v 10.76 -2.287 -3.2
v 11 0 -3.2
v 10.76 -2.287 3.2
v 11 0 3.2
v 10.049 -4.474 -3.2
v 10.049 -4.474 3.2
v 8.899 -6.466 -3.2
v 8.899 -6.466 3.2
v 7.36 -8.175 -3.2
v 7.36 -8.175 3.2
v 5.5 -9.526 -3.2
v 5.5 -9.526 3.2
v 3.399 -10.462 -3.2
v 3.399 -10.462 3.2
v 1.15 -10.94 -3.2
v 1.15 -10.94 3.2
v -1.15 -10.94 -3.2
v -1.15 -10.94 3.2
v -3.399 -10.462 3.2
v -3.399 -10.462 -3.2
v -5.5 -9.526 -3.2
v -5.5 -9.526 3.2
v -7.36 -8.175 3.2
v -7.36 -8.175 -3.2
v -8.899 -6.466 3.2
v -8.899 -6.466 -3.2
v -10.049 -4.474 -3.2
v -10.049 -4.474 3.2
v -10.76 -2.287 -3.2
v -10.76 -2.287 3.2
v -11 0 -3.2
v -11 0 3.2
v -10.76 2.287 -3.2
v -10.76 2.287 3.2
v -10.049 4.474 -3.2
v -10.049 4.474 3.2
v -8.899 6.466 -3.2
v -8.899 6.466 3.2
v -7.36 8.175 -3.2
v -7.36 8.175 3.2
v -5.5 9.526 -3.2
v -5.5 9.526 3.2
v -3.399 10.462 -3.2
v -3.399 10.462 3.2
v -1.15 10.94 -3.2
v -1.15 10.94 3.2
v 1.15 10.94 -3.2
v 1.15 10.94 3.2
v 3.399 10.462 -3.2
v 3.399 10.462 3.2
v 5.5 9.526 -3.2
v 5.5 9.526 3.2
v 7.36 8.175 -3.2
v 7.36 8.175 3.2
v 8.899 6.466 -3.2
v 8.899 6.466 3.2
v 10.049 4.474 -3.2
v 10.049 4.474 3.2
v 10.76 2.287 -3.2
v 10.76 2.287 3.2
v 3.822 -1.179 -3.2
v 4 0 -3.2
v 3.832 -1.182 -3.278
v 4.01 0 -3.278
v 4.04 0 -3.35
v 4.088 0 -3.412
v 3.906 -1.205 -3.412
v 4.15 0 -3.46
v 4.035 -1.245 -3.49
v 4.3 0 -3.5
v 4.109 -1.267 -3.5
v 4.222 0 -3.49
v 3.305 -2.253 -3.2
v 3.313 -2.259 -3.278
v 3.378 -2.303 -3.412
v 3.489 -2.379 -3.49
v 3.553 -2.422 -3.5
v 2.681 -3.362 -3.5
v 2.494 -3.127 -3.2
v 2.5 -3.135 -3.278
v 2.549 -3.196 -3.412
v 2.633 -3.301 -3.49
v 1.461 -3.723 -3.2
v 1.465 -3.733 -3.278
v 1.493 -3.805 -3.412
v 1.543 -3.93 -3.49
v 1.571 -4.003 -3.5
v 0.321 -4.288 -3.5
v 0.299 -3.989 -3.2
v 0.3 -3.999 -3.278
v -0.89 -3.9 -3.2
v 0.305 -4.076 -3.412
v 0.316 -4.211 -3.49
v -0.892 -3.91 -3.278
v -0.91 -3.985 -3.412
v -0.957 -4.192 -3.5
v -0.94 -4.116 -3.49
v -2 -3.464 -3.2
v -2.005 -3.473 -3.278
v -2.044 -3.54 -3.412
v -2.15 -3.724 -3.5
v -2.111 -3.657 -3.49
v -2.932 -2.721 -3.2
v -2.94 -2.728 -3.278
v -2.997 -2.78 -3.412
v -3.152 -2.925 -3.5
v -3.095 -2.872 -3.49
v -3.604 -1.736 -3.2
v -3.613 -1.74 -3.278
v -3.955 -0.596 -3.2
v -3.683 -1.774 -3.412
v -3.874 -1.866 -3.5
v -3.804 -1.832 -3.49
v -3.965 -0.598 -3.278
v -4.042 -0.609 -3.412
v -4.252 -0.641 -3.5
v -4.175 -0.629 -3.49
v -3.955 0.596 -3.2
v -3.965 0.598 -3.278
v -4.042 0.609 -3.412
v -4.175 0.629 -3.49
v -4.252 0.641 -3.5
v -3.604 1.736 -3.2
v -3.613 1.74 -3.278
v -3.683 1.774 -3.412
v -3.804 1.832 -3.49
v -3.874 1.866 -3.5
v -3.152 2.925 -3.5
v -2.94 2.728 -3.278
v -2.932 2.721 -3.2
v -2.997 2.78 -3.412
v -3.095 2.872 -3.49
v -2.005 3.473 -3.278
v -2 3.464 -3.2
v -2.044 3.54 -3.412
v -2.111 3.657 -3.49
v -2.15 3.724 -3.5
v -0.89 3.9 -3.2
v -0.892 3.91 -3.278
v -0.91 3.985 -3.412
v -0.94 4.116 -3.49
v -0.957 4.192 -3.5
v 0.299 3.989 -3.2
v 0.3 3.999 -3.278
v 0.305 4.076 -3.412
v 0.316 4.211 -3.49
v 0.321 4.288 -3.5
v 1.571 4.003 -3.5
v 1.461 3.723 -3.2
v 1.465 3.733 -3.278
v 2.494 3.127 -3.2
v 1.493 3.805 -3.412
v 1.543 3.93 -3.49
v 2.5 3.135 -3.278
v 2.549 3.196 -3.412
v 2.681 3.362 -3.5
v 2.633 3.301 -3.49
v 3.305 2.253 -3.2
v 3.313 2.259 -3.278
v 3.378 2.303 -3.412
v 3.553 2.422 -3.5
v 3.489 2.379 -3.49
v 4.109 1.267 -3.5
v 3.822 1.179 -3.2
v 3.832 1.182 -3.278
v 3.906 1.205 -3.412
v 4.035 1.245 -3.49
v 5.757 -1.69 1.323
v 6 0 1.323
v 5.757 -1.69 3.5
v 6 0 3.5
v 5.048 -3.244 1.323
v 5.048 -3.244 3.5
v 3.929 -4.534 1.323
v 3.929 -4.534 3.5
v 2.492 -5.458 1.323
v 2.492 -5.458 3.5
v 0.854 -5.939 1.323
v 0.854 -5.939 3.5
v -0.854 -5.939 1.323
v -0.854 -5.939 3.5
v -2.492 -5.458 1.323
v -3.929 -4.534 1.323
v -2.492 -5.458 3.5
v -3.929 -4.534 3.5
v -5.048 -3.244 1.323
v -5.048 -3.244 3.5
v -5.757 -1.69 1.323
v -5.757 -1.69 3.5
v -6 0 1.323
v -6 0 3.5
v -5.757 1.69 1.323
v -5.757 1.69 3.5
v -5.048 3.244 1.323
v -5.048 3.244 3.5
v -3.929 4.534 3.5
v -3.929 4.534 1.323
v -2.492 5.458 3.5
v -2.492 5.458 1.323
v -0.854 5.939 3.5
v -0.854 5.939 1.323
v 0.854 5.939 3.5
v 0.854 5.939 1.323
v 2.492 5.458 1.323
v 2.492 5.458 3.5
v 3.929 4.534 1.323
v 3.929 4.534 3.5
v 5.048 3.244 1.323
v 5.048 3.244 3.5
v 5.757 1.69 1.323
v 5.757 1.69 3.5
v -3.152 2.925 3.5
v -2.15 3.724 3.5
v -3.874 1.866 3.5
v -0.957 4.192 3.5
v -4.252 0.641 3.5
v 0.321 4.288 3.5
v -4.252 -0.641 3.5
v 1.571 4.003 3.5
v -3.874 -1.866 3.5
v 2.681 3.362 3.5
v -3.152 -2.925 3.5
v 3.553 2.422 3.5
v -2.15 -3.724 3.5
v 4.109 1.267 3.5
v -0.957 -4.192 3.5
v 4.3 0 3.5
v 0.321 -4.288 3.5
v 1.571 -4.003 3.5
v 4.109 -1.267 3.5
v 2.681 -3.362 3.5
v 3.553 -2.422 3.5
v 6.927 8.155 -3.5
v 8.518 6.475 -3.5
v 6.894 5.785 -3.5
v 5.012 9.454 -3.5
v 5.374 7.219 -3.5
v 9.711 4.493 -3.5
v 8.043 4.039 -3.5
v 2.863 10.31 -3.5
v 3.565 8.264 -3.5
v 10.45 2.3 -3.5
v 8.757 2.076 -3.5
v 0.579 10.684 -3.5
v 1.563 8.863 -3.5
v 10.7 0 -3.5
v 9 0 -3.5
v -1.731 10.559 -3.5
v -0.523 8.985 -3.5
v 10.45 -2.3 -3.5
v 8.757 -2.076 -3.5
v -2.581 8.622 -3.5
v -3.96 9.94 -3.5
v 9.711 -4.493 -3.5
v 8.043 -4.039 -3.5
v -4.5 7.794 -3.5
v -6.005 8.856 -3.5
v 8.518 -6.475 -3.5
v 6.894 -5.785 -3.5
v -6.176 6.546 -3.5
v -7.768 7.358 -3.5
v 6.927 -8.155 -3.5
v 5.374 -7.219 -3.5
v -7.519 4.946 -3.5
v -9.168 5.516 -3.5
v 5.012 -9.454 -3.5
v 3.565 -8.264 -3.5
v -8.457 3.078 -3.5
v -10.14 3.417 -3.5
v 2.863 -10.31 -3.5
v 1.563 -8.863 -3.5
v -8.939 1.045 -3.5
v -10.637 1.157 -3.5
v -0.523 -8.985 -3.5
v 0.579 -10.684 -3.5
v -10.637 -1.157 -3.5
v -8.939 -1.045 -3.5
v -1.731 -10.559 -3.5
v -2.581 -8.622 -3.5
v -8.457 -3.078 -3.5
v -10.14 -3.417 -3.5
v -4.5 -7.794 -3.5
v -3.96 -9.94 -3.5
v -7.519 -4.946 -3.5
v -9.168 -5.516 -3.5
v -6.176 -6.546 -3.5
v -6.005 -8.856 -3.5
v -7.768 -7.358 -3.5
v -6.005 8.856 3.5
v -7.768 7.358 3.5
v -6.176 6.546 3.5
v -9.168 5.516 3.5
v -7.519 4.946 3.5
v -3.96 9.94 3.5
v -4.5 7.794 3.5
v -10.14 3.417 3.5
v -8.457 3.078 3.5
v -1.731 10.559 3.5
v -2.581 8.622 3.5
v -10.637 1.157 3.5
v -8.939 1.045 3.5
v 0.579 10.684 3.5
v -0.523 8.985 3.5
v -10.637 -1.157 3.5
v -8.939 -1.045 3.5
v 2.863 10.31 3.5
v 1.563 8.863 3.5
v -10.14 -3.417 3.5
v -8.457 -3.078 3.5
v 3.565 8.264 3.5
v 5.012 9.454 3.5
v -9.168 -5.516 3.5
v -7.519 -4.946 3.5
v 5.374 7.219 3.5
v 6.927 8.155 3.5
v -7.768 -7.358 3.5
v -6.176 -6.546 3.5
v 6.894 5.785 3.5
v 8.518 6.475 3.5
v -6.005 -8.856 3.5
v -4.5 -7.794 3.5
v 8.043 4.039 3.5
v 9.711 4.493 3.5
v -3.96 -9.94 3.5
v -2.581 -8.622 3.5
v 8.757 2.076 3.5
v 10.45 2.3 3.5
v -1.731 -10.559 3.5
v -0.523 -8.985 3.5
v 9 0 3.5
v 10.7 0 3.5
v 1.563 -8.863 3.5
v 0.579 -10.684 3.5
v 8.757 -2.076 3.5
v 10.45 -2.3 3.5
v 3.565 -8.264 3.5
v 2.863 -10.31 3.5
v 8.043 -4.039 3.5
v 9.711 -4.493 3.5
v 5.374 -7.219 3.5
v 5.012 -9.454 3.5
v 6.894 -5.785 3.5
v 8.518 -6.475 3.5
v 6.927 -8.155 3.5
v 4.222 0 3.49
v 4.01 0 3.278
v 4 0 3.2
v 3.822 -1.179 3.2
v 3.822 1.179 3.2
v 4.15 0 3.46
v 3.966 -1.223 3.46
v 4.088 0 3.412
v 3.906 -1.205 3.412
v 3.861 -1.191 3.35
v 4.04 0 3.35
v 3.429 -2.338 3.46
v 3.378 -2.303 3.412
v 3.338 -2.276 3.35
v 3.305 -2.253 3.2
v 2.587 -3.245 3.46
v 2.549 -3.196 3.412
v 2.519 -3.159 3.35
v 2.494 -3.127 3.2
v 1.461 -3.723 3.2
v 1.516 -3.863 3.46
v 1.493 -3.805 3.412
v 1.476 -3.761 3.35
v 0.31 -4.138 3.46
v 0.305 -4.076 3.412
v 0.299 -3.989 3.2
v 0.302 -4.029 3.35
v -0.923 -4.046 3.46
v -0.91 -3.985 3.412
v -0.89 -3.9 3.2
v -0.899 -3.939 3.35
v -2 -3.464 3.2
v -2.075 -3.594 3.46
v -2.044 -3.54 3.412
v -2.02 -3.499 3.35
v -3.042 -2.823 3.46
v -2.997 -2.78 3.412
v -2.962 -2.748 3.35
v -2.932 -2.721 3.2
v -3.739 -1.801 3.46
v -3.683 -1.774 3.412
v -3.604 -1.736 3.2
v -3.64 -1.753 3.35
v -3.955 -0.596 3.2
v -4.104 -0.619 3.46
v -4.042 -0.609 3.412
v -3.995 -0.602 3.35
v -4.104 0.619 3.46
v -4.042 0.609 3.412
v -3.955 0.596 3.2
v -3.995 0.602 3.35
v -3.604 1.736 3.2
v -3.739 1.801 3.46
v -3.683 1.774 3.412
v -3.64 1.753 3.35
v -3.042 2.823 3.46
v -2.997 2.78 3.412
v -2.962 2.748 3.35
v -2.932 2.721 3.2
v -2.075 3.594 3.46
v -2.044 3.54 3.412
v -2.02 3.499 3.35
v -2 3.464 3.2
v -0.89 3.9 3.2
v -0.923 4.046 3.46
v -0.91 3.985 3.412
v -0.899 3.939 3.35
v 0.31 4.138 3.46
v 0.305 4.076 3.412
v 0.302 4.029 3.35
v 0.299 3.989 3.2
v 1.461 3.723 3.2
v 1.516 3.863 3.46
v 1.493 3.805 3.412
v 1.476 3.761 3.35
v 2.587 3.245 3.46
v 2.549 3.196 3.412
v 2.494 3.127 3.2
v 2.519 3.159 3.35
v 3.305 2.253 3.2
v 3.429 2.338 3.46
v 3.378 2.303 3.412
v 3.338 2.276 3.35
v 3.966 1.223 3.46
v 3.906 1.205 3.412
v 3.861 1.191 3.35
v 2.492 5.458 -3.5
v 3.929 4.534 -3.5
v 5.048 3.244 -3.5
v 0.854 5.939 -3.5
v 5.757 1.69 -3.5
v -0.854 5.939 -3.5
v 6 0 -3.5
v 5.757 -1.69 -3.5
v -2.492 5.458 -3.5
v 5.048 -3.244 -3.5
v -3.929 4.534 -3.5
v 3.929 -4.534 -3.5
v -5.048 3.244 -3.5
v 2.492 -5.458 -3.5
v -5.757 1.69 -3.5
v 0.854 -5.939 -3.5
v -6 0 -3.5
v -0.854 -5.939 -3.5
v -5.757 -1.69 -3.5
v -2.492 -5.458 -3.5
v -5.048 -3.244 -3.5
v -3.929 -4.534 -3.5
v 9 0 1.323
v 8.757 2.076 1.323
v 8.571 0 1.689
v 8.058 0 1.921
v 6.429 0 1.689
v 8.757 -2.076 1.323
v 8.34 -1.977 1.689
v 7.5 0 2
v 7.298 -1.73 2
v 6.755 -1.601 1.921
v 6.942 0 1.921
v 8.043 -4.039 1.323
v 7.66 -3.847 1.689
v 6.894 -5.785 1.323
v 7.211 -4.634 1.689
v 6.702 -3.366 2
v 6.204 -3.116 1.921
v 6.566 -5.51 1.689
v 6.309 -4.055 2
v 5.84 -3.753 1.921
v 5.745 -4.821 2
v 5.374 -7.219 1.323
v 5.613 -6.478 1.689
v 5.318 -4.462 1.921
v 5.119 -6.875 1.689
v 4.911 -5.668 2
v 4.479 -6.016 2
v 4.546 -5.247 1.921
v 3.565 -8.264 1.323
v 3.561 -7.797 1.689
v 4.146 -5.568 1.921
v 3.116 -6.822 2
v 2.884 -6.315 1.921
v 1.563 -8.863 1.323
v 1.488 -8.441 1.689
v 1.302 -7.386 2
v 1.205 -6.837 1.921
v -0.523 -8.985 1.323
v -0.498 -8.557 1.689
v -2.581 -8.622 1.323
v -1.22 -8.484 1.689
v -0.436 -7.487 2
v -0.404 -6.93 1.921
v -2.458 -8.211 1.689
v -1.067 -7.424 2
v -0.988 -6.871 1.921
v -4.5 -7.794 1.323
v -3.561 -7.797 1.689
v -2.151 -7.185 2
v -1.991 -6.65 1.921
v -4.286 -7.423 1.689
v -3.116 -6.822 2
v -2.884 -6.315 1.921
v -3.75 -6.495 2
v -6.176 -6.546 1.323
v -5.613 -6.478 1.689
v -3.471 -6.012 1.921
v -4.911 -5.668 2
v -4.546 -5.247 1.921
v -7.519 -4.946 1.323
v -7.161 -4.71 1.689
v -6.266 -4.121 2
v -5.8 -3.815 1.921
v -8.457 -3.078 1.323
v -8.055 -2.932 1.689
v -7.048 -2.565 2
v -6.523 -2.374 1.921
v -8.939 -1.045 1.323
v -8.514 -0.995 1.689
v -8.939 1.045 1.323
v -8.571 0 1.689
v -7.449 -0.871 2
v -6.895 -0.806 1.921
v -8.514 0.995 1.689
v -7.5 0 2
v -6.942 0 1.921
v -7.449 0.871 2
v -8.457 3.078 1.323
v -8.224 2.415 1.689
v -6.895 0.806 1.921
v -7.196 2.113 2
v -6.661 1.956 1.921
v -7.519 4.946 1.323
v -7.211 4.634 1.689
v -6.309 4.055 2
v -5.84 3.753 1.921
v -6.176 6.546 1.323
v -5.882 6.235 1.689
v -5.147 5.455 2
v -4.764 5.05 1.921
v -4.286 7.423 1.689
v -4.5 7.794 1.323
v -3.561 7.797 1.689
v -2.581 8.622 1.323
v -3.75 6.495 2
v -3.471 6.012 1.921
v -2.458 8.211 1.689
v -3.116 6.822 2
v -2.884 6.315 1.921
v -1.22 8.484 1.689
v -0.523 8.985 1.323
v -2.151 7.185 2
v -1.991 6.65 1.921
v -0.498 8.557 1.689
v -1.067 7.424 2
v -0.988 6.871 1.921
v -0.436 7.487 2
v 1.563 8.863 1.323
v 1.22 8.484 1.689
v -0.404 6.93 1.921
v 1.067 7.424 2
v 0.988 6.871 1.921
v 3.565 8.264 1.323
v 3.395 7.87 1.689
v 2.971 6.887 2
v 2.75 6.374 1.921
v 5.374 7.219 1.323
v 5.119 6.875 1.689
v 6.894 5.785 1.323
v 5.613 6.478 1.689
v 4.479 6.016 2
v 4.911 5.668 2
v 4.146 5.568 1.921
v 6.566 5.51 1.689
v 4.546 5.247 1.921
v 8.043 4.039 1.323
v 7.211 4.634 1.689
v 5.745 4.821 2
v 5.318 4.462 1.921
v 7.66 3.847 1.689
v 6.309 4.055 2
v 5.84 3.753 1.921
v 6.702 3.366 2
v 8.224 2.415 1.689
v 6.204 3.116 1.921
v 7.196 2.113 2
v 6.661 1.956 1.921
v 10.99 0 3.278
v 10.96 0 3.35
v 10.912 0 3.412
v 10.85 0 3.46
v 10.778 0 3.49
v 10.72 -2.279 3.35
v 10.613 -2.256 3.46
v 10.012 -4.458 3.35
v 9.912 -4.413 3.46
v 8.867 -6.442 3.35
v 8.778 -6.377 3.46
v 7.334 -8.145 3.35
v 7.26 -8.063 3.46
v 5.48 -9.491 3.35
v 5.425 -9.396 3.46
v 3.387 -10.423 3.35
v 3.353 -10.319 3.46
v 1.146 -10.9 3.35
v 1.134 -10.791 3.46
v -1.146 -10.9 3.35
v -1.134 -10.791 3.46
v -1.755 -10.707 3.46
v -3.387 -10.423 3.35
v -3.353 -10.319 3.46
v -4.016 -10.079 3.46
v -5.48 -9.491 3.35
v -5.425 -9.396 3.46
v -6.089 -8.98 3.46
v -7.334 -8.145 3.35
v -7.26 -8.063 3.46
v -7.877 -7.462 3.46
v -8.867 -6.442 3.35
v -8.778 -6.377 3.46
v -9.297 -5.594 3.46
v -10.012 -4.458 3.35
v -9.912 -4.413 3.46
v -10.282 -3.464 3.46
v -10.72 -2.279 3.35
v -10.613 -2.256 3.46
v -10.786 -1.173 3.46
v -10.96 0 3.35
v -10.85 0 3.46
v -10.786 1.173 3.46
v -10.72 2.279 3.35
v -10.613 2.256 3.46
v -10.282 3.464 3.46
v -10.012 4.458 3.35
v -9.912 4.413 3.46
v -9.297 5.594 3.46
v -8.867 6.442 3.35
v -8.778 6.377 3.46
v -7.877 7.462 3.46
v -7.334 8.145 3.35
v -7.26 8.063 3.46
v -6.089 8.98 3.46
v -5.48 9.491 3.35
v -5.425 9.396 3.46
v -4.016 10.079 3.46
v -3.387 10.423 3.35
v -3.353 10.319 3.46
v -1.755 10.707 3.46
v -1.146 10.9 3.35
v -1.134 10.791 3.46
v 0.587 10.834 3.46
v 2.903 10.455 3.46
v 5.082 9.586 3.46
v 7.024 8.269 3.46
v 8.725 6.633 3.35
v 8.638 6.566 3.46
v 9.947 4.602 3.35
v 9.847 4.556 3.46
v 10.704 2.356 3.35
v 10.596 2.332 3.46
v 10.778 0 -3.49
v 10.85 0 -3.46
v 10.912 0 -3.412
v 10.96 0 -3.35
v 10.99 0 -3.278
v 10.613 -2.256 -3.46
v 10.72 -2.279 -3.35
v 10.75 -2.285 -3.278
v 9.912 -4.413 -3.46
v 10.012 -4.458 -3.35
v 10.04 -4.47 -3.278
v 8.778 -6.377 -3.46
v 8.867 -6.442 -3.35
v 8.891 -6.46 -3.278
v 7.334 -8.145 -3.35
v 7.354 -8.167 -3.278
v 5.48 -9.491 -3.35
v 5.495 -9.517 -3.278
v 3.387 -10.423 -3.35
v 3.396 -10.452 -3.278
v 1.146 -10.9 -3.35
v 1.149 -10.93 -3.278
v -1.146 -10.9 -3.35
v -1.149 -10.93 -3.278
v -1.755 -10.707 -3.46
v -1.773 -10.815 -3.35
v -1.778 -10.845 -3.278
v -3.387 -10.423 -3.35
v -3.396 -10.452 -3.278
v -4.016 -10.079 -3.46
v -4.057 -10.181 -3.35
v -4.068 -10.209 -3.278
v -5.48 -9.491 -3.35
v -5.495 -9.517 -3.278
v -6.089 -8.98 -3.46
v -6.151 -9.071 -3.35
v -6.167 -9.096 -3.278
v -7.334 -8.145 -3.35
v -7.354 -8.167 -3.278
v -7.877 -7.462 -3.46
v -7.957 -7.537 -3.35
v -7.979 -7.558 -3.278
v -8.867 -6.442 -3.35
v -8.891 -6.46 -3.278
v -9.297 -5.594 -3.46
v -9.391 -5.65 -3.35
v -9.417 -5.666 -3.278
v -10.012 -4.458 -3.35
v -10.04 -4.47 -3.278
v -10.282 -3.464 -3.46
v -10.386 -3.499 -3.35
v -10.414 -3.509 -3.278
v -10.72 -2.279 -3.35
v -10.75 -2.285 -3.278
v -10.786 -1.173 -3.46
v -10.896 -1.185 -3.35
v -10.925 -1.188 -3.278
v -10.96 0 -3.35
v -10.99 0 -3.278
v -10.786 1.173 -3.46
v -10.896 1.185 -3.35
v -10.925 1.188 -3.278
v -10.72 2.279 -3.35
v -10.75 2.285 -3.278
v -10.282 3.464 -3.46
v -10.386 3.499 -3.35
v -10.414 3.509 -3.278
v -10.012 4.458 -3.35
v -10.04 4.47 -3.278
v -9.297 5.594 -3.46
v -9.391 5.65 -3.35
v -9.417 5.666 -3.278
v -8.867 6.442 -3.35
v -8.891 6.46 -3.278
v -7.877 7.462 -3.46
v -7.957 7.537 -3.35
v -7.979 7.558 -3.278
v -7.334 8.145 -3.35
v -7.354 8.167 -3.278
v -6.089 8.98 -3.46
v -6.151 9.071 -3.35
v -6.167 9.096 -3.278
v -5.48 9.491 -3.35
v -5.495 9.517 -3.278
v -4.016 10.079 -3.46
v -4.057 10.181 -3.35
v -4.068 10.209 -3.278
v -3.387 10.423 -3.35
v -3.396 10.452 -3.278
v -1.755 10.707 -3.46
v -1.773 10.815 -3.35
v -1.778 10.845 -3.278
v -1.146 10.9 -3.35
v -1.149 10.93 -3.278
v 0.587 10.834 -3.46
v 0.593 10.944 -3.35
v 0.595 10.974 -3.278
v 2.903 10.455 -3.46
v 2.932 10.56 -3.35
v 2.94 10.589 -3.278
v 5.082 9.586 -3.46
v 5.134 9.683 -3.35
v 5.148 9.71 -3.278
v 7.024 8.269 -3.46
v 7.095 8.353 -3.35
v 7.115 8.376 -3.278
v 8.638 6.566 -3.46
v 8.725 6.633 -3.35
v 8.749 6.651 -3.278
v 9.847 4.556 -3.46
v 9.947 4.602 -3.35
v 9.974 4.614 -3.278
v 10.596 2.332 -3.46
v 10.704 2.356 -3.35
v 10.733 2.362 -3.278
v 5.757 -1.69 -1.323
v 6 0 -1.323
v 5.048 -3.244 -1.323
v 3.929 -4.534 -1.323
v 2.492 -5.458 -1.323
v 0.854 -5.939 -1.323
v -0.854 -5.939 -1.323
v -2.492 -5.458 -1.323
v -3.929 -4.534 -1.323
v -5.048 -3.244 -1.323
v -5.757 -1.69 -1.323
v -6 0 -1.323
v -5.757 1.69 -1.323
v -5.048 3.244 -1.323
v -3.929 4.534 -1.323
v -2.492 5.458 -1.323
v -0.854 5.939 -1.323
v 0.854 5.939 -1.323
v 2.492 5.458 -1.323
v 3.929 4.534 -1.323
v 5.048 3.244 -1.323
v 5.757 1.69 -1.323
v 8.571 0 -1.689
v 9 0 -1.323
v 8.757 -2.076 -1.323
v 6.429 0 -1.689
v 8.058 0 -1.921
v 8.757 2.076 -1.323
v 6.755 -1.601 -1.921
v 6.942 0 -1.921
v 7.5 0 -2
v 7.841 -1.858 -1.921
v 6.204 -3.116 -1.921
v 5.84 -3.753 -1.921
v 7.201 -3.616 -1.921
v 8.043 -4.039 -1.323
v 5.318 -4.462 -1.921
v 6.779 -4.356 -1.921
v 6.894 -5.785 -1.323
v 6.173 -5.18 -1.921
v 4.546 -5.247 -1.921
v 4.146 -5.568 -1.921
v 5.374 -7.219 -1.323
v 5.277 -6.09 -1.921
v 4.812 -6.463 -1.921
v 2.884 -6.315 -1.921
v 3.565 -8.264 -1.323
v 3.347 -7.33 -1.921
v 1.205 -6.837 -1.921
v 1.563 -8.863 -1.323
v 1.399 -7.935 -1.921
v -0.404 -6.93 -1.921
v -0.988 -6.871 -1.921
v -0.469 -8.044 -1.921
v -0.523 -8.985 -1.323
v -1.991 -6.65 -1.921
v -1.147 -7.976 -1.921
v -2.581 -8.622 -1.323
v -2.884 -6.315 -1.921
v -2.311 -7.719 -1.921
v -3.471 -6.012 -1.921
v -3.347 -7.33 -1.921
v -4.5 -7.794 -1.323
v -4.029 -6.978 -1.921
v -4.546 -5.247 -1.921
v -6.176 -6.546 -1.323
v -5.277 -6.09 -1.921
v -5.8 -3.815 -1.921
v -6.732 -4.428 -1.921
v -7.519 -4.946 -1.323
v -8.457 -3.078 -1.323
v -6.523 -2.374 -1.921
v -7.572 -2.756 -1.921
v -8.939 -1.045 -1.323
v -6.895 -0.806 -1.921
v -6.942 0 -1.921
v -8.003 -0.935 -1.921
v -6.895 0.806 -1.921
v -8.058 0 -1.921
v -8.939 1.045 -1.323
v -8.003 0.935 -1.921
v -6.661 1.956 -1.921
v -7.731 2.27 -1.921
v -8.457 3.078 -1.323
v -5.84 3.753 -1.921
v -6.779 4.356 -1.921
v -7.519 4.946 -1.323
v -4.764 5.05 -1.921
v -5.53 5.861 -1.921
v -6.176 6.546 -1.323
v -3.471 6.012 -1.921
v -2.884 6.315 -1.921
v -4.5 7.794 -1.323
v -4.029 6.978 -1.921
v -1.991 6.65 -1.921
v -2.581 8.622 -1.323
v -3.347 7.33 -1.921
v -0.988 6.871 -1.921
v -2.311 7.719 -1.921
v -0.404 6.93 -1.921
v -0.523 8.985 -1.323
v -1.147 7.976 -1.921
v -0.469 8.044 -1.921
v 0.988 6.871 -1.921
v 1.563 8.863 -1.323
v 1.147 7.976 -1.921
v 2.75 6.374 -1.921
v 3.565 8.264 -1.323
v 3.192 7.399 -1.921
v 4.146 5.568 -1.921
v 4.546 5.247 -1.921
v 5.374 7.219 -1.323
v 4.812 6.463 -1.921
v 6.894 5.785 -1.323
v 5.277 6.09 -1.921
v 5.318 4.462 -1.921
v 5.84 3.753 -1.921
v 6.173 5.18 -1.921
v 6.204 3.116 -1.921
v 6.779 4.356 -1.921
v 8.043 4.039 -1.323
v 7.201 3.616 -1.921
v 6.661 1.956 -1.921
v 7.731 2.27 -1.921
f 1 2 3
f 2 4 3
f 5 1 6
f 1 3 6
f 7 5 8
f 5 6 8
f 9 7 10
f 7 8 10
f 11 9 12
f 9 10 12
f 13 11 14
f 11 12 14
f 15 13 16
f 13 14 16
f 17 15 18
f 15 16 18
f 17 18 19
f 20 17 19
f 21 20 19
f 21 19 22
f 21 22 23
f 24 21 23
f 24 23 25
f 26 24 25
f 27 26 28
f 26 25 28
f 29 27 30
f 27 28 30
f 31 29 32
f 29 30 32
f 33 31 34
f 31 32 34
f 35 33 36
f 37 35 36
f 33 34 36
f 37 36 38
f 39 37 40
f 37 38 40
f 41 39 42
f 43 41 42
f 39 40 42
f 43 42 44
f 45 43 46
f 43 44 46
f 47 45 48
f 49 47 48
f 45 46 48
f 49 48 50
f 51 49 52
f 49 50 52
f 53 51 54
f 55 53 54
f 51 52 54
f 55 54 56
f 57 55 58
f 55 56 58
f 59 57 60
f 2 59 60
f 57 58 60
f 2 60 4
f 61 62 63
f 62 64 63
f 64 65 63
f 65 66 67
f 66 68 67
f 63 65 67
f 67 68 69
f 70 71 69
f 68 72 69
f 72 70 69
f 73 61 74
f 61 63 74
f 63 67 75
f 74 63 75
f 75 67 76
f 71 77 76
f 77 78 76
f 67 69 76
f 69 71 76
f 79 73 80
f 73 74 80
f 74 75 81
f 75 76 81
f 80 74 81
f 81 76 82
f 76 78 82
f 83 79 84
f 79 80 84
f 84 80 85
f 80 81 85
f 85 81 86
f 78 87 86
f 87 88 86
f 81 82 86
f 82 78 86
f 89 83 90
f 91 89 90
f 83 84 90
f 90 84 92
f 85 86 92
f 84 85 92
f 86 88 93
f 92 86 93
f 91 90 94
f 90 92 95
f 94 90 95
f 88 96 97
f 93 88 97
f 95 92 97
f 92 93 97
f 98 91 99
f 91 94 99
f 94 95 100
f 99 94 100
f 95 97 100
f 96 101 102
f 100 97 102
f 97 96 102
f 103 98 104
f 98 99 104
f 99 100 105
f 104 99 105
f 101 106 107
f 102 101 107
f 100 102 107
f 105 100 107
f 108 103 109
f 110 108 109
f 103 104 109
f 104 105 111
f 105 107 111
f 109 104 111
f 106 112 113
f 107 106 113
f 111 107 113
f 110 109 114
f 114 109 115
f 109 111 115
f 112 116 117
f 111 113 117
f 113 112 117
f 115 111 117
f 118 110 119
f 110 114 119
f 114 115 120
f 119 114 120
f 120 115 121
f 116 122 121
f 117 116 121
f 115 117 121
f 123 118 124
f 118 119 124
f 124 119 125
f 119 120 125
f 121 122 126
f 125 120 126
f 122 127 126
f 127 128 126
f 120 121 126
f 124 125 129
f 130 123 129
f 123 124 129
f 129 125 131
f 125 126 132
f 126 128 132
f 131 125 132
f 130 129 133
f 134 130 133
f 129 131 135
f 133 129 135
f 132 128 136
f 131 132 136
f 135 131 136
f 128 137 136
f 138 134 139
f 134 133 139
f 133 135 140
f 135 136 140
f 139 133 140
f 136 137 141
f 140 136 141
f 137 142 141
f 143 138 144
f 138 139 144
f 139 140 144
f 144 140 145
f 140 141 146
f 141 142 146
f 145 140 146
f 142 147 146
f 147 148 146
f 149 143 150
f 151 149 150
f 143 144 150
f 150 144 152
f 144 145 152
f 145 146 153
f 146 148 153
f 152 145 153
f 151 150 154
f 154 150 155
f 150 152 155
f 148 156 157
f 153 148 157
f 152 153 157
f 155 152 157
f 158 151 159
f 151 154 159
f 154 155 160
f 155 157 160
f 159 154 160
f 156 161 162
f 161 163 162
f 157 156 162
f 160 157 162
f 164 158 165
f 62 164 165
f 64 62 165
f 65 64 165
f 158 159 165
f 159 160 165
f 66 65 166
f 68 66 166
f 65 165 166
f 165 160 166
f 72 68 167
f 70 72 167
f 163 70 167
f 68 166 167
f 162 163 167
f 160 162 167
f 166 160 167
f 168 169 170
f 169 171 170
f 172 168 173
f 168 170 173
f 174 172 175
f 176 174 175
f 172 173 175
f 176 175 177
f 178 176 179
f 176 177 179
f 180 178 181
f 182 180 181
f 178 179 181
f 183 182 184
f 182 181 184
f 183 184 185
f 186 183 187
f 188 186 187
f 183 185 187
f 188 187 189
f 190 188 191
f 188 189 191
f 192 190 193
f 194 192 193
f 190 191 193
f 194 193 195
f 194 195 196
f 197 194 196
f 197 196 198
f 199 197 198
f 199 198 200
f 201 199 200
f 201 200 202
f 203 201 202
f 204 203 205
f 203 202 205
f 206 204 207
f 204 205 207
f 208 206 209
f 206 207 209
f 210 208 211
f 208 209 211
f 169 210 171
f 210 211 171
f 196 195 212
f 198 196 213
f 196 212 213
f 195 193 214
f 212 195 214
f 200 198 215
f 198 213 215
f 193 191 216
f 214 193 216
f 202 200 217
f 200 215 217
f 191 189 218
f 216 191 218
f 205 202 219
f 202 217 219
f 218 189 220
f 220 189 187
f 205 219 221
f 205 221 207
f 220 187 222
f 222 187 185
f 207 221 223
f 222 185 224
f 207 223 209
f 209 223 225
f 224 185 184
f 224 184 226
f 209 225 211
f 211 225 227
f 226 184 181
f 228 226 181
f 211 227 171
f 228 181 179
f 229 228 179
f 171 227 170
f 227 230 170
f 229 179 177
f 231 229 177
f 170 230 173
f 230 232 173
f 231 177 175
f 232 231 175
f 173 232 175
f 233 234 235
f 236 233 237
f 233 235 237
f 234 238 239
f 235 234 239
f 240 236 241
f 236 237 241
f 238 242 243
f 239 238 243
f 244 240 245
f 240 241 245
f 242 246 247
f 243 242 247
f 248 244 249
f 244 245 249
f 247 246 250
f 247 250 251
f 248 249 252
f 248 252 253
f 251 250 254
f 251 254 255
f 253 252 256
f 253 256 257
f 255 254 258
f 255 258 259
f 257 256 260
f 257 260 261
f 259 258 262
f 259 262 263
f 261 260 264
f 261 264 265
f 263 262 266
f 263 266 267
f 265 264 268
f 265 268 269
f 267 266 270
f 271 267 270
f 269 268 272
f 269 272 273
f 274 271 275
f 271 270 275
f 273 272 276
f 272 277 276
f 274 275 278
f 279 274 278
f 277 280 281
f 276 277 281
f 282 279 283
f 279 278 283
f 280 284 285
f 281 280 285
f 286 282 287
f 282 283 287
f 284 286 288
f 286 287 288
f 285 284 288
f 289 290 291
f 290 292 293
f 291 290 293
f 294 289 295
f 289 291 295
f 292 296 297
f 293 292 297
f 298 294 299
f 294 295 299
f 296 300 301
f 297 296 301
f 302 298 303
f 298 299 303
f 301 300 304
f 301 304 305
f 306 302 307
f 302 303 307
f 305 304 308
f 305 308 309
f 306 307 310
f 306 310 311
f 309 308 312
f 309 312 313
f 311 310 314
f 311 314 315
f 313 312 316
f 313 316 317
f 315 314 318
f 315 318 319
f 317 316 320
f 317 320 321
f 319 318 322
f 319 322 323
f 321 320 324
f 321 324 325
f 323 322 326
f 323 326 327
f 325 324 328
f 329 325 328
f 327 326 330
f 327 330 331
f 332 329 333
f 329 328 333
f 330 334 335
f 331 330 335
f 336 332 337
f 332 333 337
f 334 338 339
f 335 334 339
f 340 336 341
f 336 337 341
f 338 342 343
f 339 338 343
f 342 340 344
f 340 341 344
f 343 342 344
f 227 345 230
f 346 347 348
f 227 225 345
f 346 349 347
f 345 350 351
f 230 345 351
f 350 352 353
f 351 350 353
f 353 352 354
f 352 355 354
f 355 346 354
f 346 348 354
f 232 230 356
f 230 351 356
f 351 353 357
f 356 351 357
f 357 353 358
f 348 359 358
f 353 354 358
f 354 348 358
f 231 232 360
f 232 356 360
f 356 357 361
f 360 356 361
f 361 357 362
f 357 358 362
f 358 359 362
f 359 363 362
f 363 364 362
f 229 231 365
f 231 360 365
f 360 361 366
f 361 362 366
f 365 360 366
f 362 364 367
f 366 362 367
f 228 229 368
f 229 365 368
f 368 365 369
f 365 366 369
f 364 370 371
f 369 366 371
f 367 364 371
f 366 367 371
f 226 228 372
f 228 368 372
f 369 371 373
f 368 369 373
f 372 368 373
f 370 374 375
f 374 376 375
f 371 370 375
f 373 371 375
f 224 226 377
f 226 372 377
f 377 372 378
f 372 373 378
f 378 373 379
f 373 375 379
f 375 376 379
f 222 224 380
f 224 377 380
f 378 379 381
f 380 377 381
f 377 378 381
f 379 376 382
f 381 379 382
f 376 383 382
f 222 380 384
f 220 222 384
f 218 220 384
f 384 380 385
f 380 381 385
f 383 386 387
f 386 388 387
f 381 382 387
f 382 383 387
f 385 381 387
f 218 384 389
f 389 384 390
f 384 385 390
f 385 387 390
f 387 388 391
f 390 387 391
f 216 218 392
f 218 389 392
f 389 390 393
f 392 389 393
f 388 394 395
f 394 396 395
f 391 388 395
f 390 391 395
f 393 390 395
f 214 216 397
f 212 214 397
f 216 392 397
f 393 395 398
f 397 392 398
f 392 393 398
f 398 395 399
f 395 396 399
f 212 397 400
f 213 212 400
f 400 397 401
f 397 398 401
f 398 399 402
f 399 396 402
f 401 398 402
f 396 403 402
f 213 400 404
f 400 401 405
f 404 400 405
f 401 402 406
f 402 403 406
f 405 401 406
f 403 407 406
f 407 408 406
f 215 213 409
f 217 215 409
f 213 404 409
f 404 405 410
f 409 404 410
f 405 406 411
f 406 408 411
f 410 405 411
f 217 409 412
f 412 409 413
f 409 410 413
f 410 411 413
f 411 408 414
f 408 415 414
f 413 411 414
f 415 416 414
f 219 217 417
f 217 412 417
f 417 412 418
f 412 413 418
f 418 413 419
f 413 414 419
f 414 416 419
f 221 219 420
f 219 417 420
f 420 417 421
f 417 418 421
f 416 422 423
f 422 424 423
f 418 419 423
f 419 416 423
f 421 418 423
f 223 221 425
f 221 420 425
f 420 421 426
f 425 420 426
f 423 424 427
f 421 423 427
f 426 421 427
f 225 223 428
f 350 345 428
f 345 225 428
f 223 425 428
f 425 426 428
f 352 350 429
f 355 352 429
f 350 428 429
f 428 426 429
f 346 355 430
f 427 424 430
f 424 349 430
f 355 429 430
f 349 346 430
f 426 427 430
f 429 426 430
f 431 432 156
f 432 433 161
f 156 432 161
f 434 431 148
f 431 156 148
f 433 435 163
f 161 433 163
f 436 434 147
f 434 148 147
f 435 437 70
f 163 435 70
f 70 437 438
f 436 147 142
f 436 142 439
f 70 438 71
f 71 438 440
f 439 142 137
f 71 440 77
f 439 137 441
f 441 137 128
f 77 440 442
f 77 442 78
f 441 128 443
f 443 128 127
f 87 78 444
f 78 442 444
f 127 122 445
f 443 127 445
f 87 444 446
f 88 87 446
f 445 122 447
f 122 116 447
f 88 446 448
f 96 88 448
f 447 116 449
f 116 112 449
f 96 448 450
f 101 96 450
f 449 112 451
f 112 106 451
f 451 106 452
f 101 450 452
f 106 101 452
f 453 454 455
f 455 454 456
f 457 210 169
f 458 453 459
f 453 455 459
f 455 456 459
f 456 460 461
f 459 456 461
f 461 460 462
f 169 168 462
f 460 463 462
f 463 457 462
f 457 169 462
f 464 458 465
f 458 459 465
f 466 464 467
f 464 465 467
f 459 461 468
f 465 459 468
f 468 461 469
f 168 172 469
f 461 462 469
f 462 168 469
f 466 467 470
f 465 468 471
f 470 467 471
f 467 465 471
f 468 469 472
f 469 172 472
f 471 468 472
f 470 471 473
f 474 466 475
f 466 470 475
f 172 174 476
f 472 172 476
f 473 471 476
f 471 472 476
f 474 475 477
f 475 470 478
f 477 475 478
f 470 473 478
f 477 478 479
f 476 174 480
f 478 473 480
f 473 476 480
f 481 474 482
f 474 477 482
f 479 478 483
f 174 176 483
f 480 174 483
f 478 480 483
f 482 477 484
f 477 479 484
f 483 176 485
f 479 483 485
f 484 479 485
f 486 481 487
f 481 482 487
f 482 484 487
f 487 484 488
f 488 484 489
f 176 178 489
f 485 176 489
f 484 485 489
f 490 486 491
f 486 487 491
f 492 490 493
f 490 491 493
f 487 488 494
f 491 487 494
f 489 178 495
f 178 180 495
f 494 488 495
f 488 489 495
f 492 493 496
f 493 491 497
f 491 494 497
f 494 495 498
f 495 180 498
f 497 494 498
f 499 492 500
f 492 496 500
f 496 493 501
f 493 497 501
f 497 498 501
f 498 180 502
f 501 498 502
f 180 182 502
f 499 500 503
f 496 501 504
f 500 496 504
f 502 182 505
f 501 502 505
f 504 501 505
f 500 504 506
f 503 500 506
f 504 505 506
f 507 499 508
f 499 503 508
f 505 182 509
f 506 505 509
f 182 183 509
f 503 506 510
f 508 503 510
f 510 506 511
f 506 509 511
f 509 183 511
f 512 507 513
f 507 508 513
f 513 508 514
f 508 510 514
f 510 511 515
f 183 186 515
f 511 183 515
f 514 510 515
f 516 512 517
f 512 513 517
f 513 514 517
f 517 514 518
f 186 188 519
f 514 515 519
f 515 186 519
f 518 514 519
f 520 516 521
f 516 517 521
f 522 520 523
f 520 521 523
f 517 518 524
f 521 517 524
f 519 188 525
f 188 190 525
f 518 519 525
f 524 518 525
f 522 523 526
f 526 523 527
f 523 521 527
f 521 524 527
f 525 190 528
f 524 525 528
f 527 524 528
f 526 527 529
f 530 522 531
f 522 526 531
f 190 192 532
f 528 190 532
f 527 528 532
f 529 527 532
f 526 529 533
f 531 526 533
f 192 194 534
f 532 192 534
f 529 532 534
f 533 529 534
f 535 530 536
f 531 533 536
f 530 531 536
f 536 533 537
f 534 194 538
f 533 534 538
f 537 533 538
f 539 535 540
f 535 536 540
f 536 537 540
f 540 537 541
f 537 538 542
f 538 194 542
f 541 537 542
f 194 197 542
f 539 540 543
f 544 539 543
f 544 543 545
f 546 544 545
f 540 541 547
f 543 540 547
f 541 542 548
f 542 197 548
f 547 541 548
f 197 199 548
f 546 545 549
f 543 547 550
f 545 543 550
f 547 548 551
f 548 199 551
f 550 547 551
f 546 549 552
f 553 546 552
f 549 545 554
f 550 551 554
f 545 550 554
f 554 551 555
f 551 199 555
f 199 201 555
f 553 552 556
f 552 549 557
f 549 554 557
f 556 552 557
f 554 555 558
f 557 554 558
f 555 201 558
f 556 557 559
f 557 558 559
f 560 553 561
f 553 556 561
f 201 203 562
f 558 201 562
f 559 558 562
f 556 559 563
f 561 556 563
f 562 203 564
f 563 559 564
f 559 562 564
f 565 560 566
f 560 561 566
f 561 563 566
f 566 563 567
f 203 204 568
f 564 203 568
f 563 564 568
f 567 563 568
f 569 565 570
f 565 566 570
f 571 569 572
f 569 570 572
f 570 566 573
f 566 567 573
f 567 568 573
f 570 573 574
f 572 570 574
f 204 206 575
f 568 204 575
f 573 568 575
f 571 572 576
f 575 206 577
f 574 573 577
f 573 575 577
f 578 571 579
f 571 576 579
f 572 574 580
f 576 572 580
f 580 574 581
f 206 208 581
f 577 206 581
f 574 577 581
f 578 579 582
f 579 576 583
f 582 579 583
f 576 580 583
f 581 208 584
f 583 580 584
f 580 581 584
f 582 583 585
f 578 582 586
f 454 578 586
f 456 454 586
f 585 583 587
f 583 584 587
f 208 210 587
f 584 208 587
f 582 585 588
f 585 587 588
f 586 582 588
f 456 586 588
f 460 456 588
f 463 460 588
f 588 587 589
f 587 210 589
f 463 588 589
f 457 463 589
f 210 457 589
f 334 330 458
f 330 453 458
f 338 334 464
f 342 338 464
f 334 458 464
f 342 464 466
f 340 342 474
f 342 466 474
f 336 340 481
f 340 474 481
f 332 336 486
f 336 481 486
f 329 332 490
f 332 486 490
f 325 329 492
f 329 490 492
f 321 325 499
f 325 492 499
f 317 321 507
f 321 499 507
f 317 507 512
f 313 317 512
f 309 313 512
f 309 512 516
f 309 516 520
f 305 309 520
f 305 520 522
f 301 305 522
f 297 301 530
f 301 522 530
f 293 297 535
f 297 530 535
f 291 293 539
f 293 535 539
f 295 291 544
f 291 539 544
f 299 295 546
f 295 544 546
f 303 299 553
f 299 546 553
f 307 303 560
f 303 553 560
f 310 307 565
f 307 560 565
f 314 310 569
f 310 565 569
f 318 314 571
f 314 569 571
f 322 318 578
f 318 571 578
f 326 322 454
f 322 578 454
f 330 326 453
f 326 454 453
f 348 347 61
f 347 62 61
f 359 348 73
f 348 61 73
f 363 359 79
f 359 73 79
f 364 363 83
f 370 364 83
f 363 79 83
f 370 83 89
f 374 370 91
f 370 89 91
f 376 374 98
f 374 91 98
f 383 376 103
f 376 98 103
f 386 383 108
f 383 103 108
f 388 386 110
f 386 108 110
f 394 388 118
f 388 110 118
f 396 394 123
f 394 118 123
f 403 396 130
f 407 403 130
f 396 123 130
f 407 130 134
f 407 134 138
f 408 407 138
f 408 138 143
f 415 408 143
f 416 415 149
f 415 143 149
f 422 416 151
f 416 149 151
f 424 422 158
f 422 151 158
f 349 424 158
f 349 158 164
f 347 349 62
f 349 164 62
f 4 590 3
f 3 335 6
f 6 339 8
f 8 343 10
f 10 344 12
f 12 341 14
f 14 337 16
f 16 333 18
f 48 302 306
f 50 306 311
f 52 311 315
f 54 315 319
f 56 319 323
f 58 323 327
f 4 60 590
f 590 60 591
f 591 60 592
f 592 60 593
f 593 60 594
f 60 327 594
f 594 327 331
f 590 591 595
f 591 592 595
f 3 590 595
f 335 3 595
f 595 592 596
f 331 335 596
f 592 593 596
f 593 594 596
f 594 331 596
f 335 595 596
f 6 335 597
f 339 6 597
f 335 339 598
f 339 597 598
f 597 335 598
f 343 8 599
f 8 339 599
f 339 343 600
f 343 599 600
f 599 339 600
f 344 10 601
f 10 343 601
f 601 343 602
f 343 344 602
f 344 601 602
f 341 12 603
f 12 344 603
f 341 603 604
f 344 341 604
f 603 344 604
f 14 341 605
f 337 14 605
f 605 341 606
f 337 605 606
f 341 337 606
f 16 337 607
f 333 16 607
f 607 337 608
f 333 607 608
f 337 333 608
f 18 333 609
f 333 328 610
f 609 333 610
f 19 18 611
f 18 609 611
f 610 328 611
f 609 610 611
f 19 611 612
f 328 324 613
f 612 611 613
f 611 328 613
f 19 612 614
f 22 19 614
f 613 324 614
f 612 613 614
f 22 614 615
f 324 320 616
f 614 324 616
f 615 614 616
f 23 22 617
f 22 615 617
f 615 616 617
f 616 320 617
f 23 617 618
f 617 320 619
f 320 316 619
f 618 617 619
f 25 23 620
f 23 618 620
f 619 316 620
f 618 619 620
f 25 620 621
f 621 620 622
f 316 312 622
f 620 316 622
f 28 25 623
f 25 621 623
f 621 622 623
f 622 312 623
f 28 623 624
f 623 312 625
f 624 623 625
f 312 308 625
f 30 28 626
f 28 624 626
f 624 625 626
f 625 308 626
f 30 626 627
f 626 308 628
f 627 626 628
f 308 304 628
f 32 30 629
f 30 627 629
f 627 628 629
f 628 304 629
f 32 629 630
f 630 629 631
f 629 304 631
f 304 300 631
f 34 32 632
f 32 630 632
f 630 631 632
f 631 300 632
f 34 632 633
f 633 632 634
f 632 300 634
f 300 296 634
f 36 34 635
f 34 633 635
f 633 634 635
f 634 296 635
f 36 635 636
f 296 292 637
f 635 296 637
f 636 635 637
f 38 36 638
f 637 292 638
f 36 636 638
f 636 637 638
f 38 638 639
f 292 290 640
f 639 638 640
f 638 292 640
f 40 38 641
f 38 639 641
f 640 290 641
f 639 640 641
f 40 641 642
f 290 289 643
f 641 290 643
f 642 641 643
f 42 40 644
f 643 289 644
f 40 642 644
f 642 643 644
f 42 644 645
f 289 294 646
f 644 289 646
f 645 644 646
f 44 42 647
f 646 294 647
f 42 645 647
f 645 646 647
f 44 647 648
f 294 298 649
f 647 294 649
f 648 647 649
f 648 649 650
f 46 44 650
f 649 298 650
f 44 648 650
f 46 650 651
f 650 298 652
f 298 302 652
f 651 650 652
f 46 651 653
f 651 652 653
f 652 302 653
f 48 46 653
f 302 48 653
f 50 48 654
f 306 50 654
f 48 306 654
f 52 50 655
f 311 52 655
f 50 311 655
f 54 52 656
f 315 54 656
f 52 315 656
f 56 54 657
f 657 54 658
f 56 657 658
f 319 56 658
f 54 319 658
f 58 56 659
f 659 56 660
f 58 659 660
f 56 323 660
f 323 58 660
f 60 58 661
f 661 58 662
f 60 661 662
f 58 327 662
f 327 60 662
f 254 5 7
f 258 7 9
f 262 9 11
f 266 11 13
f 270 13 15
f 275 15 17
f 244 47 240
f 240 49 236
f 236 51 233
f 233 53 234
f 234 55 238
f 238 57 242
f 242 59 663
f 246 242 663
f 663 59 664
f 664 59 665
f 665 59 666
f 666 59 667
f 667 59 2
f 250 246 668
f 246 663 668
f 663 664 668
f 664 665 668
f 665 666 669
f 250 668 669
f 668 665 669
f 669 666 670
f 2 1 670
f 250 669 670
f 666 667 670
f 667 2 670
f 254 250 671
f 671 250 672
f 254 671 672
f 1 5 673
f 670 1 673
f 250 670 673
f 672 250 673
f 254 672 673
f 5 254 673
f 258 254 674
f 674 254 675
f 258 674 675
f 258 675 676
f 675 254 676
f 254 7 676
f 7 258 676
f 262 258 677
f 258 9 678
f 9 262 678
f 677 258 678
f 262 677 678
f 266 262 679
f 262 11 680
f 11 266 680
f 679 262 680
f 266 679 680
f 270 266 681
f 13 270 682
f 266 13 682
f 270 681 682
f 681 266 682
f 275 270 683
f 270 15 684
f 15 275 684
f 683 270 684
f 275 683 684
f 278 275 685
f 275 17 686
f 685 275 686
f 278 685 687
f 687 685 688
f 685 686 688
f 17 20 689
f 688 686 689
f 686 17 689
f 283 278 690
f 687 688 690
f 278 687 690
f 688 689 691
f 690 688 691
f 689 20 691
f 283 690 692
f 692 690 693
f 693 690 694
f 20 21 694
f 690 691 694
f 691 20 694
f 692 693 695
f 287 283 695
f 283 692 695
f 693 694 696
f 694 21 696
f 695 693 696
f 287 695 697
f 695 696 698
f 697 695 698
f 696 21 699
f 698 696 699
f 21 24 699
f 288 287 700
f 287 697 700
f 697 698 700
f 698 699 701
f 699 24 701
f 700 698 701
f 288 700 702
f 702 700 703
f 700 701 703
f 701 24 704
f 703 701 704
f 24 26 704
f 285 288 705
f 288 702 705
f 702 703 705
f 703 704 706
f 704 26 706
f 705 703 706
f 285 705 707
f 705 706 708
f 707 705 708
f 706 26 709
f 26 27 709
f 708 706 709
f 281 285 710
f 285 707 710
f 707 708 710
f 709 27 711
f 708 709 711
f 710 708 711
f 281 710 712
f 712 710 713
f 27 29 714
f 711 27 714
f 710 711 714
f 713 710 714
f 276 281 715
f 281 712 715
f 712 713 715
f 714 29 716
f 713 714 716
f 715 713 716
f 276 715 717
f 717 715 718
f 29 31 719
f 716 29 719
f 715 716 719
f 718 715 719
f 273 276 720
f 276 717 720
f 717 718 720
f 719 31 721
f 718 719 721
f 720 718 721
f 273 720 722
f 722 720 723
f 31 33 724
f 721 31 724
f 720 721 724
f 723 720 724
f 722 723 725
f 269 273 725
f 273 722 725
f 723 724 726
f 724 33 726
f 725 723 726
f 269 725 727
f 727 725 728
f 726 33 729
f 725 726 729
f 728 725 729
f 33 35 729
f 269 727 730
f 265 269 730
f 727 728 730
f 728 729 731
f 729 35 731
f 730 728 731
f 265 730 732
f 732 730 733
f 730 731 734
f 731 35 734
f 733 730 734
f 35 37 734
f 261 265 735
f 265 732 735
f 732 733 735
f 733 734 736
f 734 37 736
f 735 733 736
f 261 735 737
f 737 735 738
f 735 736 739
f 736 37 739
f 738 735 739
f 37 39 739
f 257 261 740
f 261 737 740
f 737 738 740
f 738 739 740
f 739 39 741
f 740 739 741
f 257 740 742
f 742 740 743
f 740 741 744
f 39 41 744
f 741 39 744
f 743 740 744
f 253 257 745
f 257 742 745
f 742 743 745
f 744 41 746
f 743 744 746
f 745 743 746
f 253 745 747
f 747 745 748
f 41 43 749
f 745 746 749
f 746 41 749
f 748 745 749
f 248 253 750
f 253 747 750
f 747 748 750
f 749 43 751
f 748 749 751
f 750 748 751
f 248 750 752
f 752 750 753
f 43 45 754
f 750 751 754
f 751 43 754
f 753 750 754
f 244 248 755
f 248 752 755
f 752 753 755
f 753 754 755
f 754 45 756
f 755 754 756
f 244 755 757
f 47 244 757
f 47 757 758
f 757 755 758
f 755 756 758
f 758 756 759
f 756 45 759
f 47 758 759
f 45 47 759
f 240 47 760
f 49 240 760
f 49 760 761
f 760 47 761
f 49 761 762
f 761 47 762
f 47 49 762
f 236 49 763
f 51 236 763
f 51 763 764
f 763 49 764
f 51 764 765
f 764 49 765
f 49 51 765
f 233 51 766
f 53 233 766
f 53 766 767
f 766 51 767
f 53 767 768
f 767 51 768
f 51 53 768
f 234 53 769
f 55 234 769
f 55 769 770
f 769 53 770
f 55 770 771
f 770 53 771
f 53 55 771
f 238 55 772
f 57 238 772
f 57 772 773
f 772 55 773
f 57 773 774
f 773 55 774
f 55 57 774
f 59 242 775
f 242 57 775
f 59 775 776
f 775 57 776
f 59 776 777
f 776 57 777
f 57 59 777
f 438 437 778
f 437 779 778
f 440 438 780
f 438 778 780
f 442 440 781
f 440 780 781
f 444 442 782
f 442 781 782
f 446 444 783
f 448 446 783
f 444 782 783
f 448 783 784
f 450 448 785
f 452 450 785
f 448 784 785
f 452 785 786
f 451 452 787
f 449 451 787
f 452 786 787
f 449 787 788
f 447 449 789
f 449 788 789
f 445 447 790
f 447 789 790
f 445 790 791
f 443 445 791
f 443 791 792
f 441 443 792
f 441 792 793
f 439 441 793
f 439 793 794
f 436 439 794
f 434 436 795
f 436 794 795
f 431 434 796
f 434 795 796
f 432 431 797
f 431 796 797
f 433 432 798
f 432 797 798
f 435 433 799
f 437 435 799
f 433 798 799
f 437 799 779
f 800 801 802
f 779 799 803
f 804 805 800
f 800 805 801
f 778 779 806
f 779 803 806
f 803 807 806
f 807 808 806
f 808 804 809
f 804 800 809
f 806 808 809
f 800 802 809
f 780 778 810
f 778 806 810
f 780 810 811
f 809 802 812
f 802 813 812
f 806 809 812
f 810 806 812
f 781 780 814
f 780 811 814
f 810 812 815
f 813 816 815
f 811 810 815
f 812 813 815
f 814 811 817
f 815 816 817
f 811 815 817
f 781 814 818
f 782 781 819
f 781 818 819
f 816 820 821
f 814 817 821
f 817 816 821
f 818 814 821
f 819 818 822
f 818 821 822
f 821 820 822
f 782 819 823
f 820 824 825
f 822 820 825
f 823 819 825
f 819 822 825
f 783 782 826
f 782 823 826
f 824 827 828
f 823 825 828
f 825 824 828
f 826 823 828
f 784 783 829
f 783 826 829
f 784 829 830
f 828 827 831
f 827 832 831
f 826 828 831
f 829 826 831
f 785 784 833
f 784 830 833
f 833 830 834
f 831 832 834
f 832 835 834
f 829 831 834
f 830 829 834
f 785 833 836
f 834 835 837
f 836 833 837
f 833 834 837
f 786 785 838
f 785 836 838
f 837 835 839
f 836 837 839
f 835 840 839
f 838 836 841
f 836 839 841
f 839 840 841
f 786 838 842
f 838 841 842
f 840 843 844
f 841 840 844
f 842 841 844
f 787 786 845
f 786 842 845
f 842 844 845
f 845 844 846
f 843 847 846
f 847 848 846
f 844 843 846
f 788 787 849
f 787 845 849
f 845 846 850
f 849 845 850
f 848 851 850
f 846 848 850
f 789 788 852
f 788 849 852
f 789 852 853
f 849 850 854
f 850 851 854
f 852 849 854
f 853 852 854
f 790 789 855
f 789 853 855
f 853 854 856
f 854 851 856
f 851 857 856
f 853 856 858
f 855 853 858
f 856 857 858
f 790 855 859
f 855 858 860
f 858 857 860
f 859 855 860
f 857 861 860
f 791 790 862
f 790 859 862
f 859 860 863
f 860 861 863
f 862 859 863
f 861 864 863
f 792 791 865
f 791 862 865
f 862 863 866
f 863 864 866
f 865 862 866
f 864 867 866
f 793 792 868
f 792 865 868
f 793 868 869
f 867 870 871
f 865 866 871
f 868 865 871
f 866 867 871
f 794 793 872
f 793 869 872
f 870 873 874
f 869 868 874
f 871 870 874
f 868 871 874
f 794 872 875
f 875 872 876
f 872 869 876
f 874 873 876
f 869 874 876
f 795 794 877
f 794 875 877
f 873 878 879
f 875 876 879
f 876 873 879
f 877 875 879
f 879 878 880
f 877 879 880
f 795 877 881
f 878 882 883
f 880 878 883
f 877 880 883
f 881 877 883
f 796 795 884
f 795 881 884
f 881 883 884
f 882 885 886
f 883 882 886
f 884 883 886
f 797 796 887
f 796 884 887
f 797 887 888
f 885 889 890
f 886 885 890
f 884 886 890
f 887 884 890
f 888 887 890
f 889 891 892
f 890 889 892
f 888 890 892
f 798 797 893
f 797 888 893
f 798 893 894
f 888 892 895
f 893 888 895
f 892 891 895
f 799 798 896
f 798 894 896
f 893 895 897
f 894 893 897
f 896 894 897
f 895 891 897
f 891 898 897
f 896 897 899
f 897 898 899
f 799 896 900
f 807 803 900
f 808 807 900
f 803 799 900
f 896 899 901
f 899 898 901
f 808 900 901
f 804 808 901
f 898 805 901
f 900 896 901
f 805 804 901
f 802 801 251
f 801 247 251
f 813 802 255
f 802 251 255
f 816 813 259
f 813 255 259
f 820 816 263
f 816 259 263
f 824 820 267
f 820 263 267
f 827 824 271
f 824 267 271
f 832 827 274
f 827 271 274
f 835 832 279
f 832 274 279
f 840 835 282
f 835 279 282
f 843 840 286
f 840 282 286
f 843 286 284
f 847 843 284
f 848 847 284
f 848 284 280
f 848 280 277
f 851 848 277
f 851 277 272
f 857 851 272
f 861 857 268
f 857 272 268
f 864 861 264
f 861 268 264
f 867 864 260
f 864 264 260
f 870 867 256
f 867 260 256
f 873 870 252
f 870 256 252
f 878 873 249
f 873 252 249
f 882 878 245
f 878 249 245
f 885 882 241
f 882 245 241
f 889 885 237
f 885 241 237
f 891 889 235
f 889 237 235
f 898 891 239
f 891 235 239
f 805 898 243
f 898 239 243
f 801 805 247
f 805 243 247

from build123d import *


with BuildPart() as part:
    # Sketch1 → Revolve1 (revolve)
    with BuildSketch(Plane(origin=(0, 0, 0), x_dir=(0, 0, -1), z_dir=(1, 0, 0)), mode=Mode.PRIVATE) as revolve1_sk:
        with BuildLine():
            Line((-3.5, 6), (-3.5, 4.3))
            ThreePointArc((-3.5, 4.3), (-3.412132034, 4.087867966), (-3.2, 4))
            Line((-3.2, 4), (3.2, 4))
            ThreePointArc((3.2, 4), (3.412132034, 4.087867966), (3.5, 4.3))
            Line((3.5, 4.3), (3.5, 6))
            Line((3.5, 6), (1.322875656, 6))
            ThreePointArc((1.322875656, 6), (2, 7.5), (1.322875656, 9))
            Line((1.322875656, 9), (3.5, 9))
            Line((3.5, 9), (3.5, 10.7))
            ThreePointArc((3.5, 10.7), (3.412132034, 10.912132034), (3.2, 11))
            Line((3.2, 11), (-3.2, 11))
            ThreePointArc((-3.2, 11), (-3.412132034, 10.912132034), (-3.5, 10.7))
            Line((-3.5, 10.7), (-3.5, 9))
            Line((-3.5, 9), (-1.322875656, 9))
            ThreePointArc((-1.322875656, 9), (-2, 7.5), (-1.322875656, 6))
            Line((-1.322875656, 6), (-3.5, 6))
        make_face()
    revolve(revolve1_sk.sketch.rotate(Axis((0, 0, 0), (0, 0, -1)), 90), axis=Axis((0, 0, 0), (0, 0, -1)))


solid = part.part
